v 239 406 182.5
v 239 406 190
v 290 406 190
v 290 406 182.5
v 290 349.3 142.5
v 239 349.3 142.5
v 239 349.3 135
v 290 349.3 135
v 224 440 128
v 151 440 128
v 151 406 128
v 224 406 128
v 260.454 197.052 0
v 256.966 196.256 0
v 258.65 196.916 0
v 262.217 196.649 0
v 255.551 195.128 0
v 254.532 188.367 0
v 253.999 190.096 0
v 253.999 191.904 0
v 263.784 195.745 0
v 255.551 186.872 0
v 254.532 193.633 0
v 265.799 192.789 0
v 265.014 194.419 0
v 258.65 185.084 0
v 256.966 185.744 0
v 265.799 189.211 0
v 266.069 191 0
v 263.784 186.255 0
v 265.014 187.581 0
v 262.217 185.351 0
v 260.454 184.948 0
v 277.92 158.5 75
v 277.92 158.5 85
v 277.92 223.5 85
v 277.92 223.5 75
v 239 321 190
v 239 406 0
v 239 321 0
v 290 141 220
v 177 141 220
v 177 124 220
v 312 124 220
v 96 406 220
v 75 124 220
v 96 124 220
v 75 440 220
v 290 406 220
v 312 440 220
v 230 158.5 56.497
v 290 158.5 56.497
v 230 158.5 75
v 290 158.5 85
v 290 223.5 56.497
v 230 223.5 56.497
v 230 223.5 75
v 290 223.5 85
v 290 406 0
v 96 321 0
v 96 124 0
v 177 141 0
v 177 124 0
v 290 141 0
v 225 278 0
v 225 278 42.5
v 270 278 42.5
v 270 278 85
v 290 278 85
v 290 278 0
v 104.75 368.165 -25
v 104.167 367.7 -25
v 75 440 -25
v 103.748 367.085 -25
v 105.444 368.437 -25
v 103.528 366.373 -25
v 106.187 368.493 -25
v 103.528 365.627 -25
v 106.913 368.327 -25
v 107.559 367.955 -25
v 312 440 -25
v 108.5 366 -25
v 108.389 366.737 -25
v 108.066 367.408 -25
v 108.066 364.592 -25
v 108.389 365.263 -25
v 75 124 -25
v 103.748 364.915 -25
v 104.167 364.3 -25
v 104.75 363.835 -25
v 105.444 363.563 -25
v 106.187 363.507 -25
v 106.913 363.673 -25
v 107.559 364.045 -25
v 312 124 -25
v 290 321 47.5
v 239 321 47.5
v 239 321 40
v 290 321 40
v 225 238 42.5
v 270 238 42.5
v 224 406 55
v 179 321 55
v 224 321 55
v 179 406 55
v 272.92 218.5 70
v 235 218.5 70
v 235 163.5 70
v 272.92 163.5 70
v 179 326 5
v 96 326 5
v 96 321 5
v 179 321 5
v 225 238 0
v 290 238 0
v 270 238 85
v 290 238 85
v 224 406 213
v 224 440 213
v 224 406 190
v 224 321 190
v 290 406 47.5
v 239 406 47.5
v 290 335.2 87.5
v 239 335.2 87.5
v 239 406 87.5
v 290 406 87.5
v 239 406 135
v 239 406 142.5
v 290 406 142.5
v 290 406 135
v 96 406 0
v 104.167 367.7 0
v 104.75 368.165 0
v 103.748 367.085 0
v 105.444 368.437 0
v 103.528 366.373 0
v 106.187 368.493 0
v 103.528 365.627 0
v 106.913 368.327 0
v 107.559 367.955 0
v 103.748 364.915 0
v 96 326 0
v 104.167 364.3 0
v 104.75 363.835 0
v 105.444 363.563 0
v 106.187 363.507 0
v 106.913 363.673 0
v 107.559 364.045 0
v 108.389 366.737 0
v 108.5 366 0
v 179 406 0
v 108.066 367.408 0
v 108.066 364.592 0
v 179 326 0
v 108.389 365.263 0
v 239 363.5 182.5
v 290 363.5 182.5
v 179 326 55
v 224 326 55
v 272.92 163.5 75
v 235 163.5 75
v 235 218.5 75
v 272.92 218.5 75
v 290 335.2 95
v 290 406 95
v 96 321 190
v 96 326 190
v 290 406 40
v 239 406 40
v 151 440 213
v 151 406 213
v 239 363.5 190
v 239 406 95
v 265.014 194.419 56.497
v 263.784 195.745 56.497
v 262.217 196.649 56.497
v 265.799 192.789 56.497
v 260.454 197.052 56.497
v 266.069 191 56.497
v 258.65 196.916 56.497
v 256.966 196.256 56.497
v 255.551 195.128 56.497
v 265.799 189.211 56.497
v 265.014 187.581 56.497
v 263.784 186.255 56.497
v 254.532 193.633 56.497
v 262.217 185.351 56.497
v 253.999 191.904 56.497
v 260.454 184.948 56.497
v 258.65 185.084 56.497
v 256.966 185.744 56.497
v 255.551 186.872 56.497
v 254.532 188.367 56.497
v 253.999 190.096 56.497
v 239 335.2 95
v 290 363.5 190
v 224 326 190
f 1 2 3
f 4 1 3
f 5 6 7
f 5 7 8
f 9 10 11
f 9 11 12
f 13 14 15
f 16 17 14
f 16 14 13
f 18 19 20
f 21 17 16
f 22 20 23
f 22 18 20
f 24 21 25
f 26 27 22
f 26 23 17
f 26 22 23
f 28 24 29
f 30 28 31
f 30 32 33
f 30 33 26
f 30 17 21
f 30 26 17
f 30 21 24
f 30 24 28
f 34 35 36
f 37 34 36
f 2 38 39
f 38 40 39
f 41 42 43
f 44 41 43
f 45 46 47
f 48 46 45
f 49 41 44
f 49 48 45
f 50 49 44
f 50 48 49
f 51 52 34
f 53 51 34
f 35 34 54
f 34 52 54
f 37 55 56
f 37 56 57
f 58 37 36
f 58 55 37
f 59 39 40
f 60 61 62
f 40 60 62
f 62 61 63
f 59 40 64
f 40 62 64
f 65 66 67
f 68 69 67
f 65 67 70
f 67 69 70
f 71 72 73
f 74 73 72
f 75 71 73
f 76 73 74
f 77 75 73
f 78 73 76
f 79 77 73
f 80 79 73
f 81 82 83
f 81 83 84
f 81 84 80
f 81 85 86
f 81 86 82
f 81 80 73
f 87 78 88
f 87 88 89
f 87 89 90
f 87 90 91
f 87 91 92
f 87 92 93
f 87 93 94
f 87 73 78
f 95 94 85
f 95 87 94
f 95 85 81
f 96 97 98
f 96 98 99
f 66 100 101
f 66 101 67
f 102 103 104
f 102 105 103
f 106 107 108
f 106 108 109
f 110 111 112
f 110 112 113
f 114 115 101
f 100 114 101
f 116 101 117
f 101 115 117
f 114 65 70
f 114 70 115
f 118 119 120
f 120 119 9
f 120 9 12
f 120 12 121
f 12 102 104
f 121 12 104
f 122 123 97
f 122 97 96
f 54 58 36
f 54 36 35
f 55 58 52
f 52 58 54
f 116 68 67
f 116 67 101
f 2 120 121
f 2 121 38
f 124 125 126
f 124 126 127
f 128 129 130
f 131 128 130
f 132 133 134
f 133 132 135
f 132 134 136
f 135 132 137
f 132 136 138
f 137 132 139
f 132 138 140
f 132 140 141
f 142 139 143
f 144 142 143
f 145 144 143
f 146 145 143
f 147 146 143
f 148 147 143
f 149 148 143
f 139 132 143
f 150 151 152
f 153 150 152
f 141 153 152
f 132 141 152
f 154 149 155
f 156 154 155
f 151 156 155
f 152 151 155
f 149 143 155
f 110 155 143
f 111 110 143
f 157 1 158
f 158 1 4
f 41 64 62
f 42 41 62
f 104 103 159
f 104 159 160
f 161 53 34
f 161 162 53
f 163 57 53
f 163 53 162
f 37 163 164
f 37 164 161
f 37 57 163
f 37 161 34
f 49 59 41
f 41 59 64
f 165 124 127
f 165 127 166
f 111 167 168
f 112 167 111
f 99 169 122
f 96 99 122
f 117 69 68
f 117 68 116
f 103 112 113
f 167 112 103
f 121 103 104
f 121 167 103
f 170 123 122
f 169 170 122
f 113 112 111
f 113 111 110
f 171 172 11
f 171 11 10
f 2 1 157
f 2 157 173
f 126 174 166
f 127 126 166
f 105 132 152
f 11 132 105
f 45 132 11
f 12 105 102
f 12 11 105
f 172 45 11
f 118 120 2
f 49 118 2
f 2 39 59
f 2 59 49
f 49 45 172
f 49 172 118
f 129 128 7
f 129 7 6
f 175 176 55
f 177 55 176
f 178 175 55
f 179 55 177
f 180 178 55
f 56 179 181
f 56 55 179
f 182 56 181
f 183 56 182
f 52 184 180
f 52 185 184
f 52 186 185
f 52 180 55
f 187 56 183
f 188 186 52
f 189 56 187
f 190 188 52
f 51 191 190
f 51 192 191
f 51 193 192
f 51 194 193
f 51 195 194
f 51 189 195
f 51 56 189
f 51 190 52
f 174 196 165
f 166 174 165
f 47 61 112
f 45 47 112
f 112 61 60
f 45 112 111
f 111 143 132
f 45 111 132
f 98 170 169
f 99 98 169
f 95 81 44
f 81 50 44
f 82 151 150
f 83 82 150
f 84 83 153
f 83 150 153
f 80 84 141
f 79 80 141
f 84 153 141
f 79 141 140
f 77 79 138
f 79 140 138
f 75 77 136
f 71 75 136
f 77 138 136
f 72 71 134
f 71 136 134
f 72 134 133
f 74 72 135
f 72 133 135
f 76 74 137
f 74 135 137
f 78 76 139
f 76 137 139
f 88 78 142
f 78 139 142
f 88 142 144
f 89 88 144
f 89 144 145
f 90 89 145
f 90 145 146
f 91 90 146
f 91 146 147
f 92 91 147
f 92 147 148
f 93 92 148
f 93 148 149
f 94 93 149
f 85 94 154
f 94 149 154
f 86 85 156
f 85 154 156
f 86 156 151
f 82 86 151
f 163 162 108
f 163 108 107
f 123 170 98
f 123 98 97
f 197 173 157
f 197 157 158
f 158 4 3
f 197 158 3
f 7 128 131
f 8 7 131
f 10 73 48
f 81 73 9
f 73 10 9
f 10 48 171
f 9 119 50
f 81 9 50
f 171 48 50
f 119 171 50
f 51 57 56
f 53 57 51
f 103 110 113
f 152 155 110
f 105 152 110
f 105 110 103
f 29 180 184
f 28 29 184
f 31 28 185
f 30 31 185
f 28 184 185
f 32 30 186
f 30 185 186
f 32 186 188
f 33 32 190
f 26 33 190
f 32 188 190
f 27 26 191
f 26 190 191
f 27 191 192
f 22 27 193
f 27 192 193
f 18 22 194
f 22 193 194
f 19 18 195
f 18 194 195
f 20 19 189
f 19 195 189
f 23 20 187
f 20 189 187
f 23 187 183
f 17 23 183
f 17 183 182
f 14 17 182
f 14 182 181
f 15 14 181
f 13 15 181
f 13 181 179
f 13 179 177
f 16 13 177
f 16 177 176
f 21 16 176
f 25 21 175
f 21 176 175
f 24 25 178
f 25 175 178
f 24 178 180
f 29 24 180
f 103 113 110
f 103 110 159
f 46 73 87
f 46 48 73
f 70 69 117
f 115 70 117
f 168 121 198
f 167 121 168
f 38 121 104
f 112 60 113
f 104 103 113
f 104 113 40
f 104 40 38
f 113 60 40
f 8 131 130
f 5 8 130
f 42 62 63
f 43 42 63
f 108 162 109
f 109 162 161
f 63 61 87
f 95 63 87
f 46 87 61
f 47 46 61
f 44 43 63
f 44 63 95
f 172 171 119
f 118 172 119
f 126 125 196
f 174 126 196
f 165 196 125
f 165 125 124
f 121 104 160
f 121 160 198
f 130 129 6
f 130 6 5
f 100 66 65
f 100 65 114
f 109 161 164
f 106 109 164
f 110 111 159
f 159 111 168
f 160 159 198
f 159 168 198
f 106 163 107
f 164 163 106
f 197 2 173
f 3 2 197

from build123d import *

# Parameters (mm, degrees)
F2_DEPTH  = 220
F3_W      = 73
F3_H      = 34
F4_DEPTH  = 92
F5_W      = 73
F5_H      = 34
F6_DEPTH  = 7
F7_W      = 237
F7_H      = 316
F8_DEPTH  = 25
F9_W      = 40
F9_H      = 85
F10_DEPTH = 10
F11_R     = 2.5
F12_DEPTH = 25
F13_DEPTH = 20
F15_DEPTH = 45
F16_W     = 65
F16_H     = 85
F17_DEPTH = 60
F18_W     = 47.9200673103
F18_H     = 65
F19_DEPTH = 10
F20_W     = 65
F20_H     = 56.4966313541
F21_DEPTH = 60
F22_R     = 6.0685644394
F23_DEPTH = 56.4966313541
F24_W     = 37.9200673103
F24_H     = 55
F25_DEPTH = 5
F27_DEPTH = 5
F29_DEPTH = 123
F30_W     = 45
F30_H     = 80
F31_DEPTH = 55
F32_DEPTH = 5
F34_DEPTH = 5
F35_DEPTH = 62
F37_W     = 51
F37_H     = 7.5
F38_DEPTH = 85
F39_W     = 51
F39_H     = 7.5
F40_DEPTH = 70.8
F41_W     = 51
F41_H     = 7.5
F42_DEPTH = 56.7
F43_W     = 51
F43_H     = 7.5
F44_DEPTH = 42.5


with BuildPart() as f2:
    # F1 (on Top) → F2 (new body)
    with BuildSketch(Plane.XY):
        Polygon((224, 406), (290, 406), (290, 141), (177, 141), (177, 124), (290, 124), (312, 124), (312, 406), (312, 440), (75, 440), (75, 406), (75, 141), (75, 124), (96, 124), (96, 222), (96, 406), (151, 406), align=None)
    extrude(amount=F2_DEPTH)

    # F3 (on face) → F4 (cut)
    with BuildSketch(Plane.XY.offset(220)):
        with Locations((187.5, 423)):
            Rectangle(F3_W, F3_H)
    extrude(amount=-F4_DEPTH, mode=Mode.SUBTRACT)

    # F5 (on face) → F6 (join)
    with BuildSketch(Plane.XY.offset(220)):
        with Locations((187.5, 423)):
            Rectangle(F5_W, F5_H)
    extrude(amount=-F6_DEPTH)

    # F7 (on face) → F8 (join)
    with BuildSketch(Plane(origin=(0, 0, 0), x_dir=(1, 0, 0), z_dir=(0, 0, -1))):
        with Locations((193.5, -282)):
            Rectangle(F7_W, F7_H)
    extrude(amount=F8_DEPTH)

    # F11 (on face) → F12 (cut)
    with BuildSketch(Plane.XY):
        with Locations((106, 366)):
            Circle(F11_R)
    extrude(amount=-F12_DEPTH, mode=Mode.SUBTRACT)

    # F26 (on face) → F27 (join)
    with BuildSketch(Plane.XY):
        Polygon((96, 326), (96, 321), (239, 321), (239, 406), (224, 406), (224, 326), align=None)
    extrude(amount=F27_DEPTH)

    # F28 (on face) → F29 (join, through all)
    with BuildSketch(Plane.XY.offset(5)):
        Polygon((239, 406), (224, 406), (224, 326), (224, 321), (239, 321), align=None)
    extrude(amount=F29_DEPTH)

    # F30 (on face) → F31 (join)
    with BuildSketch(Plane.XY):
        with Locations((201.5, 366)):
            Rectangle(F30_W, F30_H)
    extrude(amount=F31_DEPTH)

    # F32 (add, through all): a face of the model
    f32_faces = [f2.faces().sort_by_distance(p)[0] for p in [
        (201.5, 326, 30),
    ]]
    extrude(f32_faces, amount=F32_DEPTH)

    # F35 (add, through all): a face of the model
    f35_faces = [f2.faces().sort_by_distance(p)[0] for p in [
        (231.5, 363.5, 128),
    ]]
    extrude(f35_faces, amount=F35_DEPTH)


with BuildPart() as f10:
    # F9 (on face) → F10 (new body)
    with BuildSketch(Plane(origin=(290, 0, 0), x_dir=(0, -1, 0), z_dir=(-1, 0, 0))):
        with Locations((-258, 42.5)):
            Rectangle(F9_W, F9_H)
    extrude(amount=F10_DEPTH)

    # F9 (on face) → F13 (join)
    with BuildSketch(Plane(origin=(290, 0, 0), x_dir=(0, -1, 0), z_dir=(-1, 0, 0))):
        with Locations((-258, 42.5)):
            Rectangle(F9_W, F9_H)
    extrude(amount=F13_DEPTH)

    # F14 (on face) → F15 (join)
    with BuildSketch(Plane(origin=(270, 0, 0), x_dir=(0, -1, 0), z_dir=(-1, 0, 0))):
        Polygon((-238, 0), (-238, 42.5), (-258, 42.5), (-278, 42.5), (-278, 0), align=None)
    extrude(amount=F15_DEPTH)


with BuildPart() as f17:
    # F16 (on face) → F17 (new body)
    with BuildSketch(Plane(origin=(290, 0, 0), x_dir=(0, -1, 0), z_dir=(-1, 0, 0))):
        with Locations((-191, 42.5)):
            Rectangle(F16_W, F16_H)
    extrude(amount=F17_DEPTH)

    # F18 (on face) → F19 (cut)
    with BuildSketch(Plane.XY.offset(85)):
        with Locations((253.9600336552, 191)):
            Rectangle(F18_W, F18_H)
    extrude(amount=-F19_DEPTH, mode=Mode.SUBTRACT)

    # F20 (on face) → F21 (cut, through all)
    with BuildSketch(Plane(origin=(230, 0, 0), x_dir=(0, -1, 0), z_dir=(-1, 0, 0))):
        with Locations((-191, 28.248315677)):
            Rectangle(F20_W, F20_H)
    extrude(amount=-F21_DEPTH, mode=Mode.SUBTRACT)

    # F22 (on face) → F23 (join, through all)
    with BuildSketch(Plane(origin=(0, 0, 56.4966313541), x_dir=(1, 0, 0), z_dir=(0, 0, -1))):
        with Locations((260.0000000006, -191)):
            Circle(F22_R)
    extrude(amount=F23_DEPTH)

    # F24 (on face) → F25 (cut)
    with BuildSketch(Plane.XY.offset(75)):
        with Locations((253.9600336552, 191)):
            Rectangle(F24_W, F24_H)
    extrude(amount=-F25_DEPTH, mode=Mode.SUBTRACT)


with BuildPart() as f34:
    # F33 (on face) → F34 (new body, through all)
    with BuildSketch(Plane.XZ.offset(-321)):
        Polygon((179, 5), (179, 55), (224, 55), (224, 190), (96, 190), (96, 5), align=None)
    extrude(amount=-F34_DEPTH)


with BuildPart() as f38:
    # F37 (on face) → F38 (new body)
    with BuildSketch(Plane.XZ.offset(-406)):
        with Locations((264.5, 43.75)):
            Rectangle(F37_W, F37_H)
    extrude(amount=F38_DEPTH)


with BuildPart() as f40:
    # F39 (on face) → F40 (new body)
    with BuildSketch(Plane.XZ.offset(-406)):
        with Locations((264.5, 91.25)):
            Rectangle(F39_W, F39_H)
    extrude(amount=F40_DEPTH)


with BuildPart() as f42:
    # F41 (on face) → F42 (new body)
    with BuildSketch(Plane.XZ.offset(-406)):
        with Locations((264.5, 138.75)):
            Rectangle(F41_W, F41_H)
    extrude(amount=F42_DEPTH)


with BuildPart() as f44:
    # F43 (on face) → F44 (new body)
    with BuildSketch(Plane.XZ.offset(-406)):
        with Locations((264.5, 186.25)):
            Rectangle(F43_W, F43_H)
    extrude(amount=F44_DEPTH)


solid = Compound([f2.part, f10.part, f17.part, f34.part, f38.part, f40.part, f42.part, f44.part])
